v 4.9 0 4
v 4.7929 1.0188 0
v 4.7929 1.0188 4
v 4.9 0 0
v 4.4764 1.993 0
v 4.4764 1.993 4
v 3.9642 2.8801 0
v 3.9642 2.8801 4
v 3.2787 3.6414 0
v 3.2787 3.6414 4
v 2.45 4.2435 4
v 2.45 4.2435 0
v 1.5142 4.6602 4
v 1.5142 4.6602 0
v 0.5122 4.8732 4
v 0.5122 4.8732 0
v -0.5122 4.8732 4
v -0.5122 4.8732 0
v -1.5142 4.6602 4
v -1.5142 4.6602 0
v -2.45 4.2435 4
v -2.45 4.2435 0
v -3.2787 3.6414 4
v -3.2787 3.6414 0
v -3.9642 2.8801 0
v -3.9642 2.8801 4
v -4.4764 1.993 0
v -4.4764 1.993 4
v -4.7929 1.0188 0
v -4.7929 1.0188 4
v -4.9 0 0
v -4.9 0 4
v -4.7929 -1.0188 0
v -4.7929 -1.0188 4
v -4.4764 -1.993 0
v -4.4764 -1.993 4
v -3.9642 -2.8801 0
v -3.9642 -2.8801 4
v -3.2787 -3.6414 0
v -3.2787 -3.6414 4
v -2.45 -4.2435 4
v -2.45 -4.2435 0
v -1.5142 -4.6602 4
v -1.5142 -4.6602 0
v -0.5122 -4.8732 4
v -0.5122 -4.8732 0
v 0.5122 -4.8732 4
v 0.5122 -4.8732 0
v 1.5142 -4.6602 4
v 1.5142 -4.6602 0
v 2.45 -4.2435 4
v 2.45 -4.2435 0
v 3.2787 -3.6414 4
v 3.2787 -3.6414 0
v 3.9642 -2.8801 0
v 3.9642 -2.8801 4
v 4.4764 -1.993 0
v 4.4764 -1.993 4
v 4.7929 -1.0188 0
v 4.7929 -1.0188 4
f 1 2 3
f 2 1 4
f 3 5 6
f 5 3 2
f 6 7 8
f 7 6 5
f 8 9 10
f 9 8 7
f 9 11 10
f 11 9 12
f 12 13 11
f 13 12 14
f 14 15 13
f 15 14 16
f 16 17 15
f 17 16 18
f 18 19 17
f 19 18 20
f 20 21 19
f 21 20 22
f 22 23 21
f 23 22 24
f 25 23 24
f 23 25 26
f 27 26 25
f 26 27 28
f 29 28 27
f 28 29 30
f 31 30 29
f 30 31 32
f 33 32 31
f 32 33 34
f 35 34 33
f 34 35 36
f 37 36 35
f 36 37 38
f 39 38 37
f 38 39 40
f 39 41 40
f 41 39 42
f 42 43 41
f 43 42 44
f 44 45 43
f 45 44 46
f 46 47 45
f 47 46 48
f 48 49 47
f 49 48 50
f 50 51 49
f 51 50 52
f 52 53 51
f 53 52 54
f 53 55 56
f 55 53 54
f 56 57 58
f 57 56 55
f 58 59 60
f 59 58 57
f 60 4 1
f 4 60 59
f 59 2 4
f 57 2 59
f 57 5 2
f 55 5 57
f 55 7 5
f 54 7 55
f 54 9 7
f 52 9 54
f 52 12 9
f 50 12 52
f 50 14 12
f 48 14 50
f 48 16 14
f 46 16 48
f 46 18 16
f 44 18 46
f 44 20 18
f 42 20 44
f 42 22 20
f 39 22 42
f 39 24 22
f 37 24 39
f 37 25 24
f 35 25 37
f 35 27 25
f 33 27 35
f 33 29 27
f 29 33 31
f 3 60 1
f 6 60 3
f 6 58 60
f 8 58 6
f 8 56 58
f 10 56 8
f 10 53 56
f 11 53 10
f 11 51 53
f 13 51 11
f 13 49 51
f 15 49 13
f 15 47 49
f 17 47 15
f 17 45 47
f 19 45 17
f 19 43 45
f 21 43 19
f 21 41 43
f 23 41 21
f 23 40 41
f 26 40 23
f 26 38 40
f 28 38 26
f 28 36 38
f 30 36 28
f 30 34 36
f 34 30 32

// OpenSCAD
tubeD = 10;
sectionL = 15;
$fn=30;
tol=0.1;
difference(){
    translate([0,0,2.5]){
%cylinder(d=tubeD+10,h=4*sectionL-5);
    }
union(){
cylinder(d=tubeD,h=sectionL);

translate([0,0,sectionL]){
cylinder(d1=tubeD,d2=2,h=sectionL);
    }
    
translate([0,0,2*sectionL]){
cylinder(d1=2,d2=tubeD,h=sectionL);
    }
    
translate([0,0,3*sectionL]){
cylinder(d=tubeD,h=sectionL);
    }


translate([-0.5,0,2*sectionL]){
    rotate([0,90,0]){    
        cylinder(d=1,h=30);
    }//end rotate
    }//end translate

}//end union
}//end difference


cylinder(d=tubeD-2*tol,h=4);
